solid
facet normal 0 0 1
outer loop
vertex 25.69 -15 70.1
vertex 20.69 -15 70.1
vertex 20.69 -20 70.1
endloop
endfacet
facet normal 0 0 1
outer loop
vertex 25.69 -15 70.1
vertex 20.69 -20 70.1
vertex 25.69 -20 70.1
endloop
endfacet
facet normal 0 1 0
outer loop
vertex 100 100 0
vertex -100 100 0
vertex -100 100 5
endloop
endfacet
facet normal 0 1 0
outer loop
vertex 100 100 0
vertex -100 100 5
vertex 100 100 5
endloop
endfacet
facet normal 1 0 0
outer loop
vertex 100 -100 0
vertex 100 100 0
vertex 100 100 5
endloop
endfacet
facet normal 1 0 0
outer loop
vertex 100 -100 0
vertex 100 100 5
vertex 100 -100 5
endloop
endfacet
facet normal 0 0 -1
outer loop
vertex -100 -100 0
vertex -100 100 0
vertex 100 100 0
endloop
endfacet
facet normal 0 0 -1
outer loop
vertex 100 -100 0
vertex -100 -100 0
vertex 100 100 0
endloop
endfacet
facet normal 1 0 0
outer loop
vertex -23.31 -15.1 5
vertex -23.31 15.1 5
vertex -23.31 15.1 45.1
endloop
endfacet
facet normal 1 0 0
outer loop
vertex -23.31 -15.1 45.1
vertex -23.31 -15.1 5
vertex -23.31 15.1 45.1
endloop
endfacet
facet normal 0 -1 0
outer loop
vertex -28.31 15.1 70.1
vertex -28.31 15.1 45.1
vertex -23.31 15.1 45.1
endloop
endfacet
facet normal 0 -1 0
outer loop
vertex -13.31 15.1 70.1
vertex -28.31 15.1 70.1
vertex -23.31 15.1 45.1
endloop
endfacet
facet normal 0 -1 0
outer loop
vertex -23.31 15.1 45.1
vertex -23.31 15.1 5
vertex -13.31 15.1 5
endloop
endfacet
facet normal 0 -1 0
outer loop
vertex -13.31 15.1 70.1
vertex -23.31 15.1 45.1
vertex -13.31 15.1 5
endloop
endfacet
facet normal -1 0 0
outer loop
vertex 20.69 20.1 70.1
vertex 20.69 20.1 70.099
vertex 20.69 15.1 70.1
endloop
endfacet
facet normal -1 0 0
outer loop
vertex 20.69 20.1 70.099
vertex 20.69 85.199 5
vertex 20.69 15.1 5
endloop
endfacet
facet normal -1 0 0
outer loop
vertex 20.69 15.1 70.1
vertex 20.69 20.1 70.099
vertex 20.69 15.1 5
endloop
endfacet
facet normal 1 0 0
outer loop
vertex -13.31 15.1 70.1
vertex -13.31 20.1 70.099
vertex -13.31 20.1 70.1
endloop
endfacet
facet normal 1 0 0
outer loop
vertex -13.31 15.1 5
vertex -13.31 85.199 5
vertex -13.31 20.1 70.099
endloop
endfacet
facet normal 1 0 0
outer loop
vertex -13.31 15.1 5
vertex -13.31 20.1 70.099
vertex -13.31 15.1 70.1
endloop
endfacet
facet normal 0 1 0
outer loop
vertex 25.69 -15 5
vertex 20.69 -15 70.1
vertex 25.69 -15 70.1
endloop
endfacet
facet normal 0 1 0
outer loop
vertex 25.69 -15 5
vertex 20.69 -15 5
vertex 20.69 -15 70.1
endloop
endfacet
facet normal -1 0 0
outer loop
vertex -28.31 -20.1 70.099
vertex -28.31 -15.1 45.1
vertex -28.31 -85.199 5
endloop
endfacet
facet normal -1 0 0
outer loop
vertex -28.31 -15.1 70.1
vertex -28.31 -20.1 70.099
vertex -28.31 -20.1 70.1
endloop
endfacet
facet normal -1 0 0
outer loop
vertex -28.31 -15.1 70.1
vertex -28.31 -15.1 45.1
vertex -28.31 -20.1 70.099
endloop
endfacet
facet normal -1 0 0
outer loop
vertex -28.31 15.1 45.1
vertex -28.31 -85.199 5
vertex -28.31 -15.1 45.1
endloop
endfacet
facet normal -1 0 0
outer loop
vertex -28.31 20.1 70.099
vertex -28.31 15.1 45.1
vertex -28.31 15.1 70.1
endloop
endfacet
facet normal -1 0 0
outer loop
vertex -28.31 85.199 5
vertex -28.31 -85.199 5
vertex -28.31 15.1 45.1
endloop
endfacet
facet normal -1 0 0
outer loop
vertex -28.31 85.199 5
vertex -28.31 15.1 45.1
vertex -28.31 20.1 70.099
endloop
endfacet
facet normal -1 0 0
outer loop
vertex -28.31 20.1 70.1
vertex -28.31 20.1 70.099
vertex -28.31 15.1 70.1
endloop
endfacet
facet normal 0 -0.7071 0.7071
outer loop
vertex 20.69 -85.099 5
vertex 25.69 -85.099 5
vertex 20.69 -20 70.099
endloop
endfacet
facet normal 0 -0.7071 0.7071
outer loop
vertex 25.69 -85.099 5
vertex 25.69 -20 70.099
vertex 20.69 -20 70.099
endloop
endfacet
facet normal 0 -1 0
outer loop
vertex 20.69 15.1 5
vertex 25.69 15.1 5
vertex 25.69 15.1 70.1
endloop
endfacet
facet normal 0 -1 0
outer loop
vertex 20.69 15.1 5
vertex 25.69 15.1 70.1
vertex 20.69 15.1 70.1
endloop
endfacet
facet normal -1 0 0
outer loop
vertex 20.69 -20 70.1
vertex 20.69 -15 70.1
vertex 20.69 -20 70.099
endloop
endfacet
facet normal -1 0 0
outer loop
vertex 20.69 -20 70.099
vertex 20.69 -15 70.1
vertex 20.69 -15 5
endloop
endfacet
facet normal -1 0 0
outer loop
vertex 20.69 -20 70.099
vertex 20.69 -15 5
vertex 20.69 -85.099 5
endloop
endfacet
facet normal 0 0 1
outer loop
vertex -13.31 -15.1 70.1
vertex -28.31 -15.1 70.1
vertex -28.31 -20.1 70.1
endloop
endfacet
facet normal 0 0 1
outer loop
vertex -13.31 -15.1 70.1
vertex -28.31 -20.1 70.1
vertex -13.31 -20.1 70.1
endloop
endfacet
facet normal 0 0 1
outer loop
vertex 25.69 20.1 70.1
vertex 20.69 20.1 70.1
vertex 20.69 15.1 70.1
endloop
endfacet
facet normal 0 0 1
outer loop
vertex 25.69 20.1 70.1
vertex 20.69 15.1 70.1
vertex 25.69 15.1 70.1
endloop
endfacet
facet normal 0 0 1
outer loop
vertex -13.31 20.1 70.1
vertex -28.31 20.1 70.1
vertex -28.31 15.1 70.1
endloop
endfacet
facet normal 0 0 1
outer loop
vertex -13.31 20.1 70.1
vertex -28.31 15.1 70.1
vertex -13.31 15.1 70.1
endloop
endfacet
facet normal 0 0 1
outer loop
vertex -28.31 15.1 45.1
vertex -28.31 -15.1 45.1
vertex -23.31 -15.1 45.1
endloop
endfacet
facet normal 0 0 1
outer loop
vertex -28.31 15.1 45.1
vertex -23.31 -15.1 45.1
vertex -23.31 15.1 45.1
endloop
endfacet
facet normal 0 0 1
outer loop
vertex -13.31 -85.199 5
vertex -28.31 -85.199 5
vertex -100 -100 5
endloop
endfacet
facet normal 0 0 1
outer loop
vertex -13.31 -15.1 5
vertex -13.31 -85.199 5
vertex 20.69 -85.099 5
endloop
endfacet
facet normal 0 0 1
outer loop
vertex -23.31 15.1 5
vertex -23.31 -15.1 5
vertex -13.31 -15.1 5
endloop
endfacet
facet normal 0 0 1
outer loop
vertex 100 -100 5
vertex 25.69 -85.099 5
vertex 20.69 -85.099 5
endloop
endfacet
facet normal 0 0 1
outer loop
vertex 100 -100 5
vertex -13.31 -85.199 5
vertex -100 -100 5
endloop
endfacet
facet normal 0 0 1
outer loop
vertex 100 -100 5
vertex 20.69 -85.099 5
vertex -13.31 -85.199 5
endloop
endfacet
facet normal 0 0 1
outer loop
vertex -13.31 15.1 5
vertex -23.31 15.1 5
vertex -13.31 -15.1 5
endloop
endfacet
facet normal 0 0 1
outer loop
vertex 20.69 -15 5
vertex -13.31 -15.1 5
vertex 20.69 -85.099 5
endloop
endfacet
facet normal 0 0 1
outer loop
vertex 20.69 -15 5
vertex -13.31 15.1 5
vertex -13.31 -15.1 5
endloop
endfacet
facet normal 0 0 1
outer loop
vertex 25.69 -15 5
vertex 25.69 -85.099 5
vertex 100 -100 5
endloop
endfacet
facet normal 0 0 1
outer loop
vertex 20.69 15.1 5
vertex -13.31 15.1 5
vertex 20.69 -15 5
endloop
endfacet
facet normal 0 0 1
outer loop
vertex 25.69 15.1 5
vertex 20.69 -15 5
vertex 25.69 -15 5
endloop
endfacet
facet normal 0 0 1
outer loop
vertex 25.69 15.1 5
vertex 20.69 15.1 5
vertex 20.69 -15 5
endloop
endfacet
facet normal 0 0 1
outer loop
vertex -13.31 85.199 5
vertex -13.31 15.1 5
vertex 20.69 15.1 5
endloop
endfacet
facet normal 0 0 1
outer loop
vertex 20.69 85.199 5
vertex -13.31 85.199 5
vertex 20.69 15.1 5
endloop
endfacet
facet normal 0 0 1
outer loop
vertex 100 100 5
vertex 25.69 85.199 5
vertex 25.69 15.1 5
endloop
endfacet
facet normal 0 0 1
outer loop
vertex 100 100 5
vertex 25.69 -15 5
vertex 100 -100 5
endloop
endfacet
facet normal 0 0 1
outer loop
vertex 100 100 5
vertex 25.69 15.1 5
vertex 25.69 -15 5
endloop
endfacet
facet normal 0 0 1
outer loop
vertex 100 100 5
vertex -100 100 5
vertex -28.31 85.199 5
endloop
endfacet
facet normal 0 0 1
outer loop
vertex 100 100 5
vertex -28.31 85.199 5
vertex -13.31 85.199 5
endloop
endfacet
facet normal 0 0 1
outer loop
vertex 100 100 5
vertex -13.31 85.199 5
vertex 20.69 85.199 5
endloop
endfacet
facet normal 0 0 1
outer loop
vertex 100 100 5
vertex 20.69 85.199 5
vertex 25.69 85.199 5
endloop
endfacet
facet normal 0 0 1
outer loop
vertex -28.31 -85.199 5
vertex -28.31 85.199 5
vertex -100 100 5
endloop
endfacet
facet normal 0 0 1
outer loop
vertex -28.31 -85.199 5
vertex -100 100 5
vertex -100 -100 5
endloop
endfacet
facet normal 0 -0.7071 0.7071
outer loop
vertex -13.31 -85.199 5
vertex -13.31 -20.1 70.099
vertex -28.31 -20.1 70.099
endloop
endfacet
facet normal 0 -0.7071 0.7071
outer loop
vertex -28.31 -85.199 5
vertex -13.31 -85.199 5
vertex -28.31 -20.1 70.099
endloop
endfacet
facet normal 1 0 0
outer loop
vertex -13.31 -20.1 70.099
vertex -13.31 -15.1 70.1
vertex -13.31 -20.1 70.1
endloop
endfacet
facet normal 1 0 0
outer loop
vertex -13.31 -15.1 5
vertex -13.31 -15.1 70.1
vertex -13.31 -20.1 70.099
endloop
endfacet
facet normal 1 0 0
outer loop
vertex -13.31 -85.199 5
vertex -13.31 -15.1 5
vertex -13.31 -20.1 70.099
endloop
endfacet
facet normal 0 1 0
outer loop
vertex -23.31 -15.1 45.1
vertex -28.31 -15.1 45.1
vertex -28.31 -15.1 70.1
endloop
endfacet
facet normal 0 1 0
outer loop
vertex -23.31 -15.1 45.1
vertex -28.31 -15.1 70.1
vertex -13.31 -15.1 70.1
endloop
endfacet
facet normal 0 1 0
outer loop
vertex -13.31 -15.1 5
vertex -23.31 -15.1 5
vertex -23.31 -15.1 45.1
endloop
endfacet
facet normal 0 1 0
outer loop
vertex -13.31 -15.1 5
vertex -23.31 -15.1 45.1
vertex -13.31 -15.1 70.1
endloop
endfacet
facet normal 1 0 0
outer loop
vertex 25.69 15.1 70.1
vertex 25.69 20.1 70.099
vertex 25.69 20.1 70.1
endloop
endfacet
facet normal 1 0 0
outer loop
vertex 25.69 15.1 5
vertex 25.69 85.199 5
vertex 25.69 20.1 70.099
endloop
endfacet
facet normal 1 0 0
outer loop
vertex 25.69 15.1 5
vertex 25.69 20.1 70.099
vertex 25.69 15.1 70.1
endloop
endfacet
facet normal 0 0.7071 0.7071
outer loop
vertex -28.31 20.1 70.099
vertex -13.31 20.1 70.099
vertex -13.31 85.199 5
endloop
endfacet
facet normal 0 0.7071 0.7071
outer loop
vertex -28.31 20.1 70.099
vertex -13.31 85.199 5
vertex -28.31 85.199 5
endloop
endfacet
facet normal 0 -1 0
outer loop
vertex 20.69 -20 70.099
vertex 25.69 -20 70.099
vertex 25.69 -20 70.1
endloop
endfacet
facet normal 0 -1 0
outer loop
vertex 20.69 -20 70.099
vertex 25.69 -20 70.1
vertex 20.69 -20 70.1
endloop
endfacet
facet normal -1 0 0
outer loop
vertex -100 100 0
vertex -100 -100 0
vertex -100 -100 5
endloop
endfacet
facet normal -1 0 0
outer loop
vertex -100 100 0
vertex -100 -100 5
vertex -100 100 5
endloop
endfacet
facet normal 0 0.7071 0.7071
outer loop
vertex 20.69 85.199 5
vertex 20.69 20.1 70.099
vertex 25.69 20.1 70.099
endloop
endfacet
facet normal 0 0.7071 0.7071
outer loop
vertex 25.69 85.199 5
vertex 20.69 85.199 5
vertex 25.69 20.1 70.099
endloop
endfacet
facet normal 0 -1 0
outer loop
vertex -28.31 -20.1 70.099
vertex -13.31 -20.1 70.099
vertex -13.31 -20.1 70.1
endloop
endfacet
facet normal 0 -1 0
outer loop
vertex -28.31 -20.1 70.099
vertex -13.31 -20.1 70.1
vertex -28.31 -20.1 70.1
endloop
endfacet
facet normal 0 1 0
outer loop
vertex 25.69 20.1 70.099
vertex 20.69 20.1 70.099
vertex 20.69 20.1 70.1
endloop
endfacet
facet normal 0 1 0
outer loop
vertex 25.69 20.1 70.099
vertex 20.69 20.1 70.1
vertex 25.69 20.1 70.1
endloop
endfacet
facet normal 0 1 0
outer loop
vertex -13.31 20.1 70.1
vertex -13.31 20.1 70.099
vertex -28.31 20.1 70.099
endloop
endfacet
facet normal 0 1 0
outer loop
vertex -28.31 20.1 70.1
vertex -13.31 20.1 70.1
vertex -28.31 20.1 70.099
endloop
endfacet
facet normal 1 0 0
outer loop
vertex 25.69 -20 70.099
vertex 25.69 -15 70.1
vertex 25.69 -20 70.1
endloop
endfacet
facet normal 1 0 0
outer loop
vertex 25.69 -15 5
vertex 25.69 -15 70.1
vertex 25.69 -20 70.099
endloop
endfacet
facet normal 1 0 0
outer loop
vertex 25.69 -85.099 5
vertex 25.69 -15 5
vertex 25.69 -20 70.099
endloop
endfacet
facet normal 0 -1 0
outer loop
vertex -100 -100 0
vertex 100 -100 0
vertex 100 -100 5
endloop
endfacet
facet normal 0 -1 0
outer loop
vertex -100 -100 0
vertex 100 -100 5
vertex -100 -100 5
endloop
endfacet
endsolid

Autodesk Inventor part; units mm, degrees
ref_plane "YZ Plane" through (0, 0, 0) normal (1, 0, 0) x (0, 1, 0)
ref_plane "XZ Plane" through (0, 0, 0) normal (0, 1, 0) x (-1, 0, 0)
sketch "Sketch1" plane through (0, 0, 0) normal (0, 0, 1) x (1, 0, 0)
  line L0 (-100, 100) -> (100, 100)
  line L1 (100, 100) -> (100, -100)
  line L2 (100, -100) -> (-100, -100)
  line L3 (-100, -100) -> (-100, 100)
  line L4 (-100, 100) -> (100, -100) construction
  line L5 (100, 100) -> (-100, -100) construction
  point P0 (0, 0)
  dimension "d0" = 200
  dimension "d1" = 200
extrude "Extrusion1" add sketch "Sketch1" along normal blind 5
ref_plane "Work Plane1" through (-17.3121, -15, 70.1) normal (0, 0, 1) x (1, 0, 0)
sketch "Sketch3" plane through (0, 0, 5) normal (0, 0, 1) x (1, 0, 0)
  line L0 (-13.3095, -15) -> (-13.3095, -20.1)
  line L1 (-13.3095, -14.5) -> (-18.3095, -14.5)
  line L2 (20.6905, -15) -> (20.6905, -20.1)
  line L3 (25.6905, -14.5) -> (20.6905, -14.5)
  line L4 (-13.3095, 20.1) -> (-13.3095, 15)
  line L5 (-18.3095, 14.5) -> (-13.3095, 14.5)
  line L6 (20.6905, 20.1) -> (20.6905, 15)
  line L7 (25.6905, 14.5) -> (20.6905, 14.5)
  line L8 (20.6905, -15) -> (25.6905, -15)
  line L9 (25.6905, -15) -> (25.6905, -20)
  line L10 (25.6905, -20) -> (20.6905, -20)
  line L11 (20.6905, -20) -> (20.6905, -15)
  line L12 (-13.3095, -20.1) -> (-28.3095, -20.1)
  line L13 (-28.3095, -20.1) -> (-28.3095, -15.1)
  line L14 (-28.3095, -15.1) -> (-13.3095, -15.1)
  line L15 (-13.3095, -15.1) -> (-13.3095, -20.1)
  line L16 (-13.3095, 20.1) -> (-28.3095, 20.1)
  line L17 (-28.3095, 20.1) -> (-28.3095, 15.1)
  line L18 (-28.3095, 15.1) -> (-13.3095, 15.1)
  line L19 (-13.3095, 15.1) -> (-13.3095, 20.1)
  line L20 (20.6905, 20.1) -> (25.6905, 20.1)
  line L21 (25.6905, 20.1) -> (25.6905, 15.1)
  line L22 (25.6905, 15.1) -> (20.6905, 15.1)
  line L23 (20.6905, 15.1) -> (20.6905, 20.1)
  point P0 (0, 0)
extrude "Extrusion2" add sketch "Sketch3" along normal up to surface (65.1 mm away)
chamfer "Chamfer1" distance 65.1 angle 45 5 edges at (-20.8095, 20.1, 5) (23.1905, 20.1, 5) (-28.3095, -20.1, 37.55) (-20.8095, -20.1, 5) (23.1905, -20, 5)
sketch "Sketch4" plane through (-28.3095, 15.1, 5) normal (-1, 0, 0) x (0, 0, 1)
  line L0 (0, 0) -> (65.1, 0) projected
  line L1 (65.1, 0) -> (40.1, 0)
  line L2 (65.1, 0) -> (90.1, 0) construction
  line L3 (0, -30.2) -> (65.1, -30.2) projected
  line L4 (40.1, 0) -> (0, 0)
  line L5 (0, 0) -> (0, -30.2)
  line L6 (0, -30.2) -> (40.1, -30.2)
  line L7 (40.1, -30.2) -> (40.1, 0)
  point P0 (-5, -15.1)
  dimension "d17" = 25
  dimension "d18" = 180
extrude "Extrusion3" add sketch "Sketch4" against normal blind 5
properties part number "base"
